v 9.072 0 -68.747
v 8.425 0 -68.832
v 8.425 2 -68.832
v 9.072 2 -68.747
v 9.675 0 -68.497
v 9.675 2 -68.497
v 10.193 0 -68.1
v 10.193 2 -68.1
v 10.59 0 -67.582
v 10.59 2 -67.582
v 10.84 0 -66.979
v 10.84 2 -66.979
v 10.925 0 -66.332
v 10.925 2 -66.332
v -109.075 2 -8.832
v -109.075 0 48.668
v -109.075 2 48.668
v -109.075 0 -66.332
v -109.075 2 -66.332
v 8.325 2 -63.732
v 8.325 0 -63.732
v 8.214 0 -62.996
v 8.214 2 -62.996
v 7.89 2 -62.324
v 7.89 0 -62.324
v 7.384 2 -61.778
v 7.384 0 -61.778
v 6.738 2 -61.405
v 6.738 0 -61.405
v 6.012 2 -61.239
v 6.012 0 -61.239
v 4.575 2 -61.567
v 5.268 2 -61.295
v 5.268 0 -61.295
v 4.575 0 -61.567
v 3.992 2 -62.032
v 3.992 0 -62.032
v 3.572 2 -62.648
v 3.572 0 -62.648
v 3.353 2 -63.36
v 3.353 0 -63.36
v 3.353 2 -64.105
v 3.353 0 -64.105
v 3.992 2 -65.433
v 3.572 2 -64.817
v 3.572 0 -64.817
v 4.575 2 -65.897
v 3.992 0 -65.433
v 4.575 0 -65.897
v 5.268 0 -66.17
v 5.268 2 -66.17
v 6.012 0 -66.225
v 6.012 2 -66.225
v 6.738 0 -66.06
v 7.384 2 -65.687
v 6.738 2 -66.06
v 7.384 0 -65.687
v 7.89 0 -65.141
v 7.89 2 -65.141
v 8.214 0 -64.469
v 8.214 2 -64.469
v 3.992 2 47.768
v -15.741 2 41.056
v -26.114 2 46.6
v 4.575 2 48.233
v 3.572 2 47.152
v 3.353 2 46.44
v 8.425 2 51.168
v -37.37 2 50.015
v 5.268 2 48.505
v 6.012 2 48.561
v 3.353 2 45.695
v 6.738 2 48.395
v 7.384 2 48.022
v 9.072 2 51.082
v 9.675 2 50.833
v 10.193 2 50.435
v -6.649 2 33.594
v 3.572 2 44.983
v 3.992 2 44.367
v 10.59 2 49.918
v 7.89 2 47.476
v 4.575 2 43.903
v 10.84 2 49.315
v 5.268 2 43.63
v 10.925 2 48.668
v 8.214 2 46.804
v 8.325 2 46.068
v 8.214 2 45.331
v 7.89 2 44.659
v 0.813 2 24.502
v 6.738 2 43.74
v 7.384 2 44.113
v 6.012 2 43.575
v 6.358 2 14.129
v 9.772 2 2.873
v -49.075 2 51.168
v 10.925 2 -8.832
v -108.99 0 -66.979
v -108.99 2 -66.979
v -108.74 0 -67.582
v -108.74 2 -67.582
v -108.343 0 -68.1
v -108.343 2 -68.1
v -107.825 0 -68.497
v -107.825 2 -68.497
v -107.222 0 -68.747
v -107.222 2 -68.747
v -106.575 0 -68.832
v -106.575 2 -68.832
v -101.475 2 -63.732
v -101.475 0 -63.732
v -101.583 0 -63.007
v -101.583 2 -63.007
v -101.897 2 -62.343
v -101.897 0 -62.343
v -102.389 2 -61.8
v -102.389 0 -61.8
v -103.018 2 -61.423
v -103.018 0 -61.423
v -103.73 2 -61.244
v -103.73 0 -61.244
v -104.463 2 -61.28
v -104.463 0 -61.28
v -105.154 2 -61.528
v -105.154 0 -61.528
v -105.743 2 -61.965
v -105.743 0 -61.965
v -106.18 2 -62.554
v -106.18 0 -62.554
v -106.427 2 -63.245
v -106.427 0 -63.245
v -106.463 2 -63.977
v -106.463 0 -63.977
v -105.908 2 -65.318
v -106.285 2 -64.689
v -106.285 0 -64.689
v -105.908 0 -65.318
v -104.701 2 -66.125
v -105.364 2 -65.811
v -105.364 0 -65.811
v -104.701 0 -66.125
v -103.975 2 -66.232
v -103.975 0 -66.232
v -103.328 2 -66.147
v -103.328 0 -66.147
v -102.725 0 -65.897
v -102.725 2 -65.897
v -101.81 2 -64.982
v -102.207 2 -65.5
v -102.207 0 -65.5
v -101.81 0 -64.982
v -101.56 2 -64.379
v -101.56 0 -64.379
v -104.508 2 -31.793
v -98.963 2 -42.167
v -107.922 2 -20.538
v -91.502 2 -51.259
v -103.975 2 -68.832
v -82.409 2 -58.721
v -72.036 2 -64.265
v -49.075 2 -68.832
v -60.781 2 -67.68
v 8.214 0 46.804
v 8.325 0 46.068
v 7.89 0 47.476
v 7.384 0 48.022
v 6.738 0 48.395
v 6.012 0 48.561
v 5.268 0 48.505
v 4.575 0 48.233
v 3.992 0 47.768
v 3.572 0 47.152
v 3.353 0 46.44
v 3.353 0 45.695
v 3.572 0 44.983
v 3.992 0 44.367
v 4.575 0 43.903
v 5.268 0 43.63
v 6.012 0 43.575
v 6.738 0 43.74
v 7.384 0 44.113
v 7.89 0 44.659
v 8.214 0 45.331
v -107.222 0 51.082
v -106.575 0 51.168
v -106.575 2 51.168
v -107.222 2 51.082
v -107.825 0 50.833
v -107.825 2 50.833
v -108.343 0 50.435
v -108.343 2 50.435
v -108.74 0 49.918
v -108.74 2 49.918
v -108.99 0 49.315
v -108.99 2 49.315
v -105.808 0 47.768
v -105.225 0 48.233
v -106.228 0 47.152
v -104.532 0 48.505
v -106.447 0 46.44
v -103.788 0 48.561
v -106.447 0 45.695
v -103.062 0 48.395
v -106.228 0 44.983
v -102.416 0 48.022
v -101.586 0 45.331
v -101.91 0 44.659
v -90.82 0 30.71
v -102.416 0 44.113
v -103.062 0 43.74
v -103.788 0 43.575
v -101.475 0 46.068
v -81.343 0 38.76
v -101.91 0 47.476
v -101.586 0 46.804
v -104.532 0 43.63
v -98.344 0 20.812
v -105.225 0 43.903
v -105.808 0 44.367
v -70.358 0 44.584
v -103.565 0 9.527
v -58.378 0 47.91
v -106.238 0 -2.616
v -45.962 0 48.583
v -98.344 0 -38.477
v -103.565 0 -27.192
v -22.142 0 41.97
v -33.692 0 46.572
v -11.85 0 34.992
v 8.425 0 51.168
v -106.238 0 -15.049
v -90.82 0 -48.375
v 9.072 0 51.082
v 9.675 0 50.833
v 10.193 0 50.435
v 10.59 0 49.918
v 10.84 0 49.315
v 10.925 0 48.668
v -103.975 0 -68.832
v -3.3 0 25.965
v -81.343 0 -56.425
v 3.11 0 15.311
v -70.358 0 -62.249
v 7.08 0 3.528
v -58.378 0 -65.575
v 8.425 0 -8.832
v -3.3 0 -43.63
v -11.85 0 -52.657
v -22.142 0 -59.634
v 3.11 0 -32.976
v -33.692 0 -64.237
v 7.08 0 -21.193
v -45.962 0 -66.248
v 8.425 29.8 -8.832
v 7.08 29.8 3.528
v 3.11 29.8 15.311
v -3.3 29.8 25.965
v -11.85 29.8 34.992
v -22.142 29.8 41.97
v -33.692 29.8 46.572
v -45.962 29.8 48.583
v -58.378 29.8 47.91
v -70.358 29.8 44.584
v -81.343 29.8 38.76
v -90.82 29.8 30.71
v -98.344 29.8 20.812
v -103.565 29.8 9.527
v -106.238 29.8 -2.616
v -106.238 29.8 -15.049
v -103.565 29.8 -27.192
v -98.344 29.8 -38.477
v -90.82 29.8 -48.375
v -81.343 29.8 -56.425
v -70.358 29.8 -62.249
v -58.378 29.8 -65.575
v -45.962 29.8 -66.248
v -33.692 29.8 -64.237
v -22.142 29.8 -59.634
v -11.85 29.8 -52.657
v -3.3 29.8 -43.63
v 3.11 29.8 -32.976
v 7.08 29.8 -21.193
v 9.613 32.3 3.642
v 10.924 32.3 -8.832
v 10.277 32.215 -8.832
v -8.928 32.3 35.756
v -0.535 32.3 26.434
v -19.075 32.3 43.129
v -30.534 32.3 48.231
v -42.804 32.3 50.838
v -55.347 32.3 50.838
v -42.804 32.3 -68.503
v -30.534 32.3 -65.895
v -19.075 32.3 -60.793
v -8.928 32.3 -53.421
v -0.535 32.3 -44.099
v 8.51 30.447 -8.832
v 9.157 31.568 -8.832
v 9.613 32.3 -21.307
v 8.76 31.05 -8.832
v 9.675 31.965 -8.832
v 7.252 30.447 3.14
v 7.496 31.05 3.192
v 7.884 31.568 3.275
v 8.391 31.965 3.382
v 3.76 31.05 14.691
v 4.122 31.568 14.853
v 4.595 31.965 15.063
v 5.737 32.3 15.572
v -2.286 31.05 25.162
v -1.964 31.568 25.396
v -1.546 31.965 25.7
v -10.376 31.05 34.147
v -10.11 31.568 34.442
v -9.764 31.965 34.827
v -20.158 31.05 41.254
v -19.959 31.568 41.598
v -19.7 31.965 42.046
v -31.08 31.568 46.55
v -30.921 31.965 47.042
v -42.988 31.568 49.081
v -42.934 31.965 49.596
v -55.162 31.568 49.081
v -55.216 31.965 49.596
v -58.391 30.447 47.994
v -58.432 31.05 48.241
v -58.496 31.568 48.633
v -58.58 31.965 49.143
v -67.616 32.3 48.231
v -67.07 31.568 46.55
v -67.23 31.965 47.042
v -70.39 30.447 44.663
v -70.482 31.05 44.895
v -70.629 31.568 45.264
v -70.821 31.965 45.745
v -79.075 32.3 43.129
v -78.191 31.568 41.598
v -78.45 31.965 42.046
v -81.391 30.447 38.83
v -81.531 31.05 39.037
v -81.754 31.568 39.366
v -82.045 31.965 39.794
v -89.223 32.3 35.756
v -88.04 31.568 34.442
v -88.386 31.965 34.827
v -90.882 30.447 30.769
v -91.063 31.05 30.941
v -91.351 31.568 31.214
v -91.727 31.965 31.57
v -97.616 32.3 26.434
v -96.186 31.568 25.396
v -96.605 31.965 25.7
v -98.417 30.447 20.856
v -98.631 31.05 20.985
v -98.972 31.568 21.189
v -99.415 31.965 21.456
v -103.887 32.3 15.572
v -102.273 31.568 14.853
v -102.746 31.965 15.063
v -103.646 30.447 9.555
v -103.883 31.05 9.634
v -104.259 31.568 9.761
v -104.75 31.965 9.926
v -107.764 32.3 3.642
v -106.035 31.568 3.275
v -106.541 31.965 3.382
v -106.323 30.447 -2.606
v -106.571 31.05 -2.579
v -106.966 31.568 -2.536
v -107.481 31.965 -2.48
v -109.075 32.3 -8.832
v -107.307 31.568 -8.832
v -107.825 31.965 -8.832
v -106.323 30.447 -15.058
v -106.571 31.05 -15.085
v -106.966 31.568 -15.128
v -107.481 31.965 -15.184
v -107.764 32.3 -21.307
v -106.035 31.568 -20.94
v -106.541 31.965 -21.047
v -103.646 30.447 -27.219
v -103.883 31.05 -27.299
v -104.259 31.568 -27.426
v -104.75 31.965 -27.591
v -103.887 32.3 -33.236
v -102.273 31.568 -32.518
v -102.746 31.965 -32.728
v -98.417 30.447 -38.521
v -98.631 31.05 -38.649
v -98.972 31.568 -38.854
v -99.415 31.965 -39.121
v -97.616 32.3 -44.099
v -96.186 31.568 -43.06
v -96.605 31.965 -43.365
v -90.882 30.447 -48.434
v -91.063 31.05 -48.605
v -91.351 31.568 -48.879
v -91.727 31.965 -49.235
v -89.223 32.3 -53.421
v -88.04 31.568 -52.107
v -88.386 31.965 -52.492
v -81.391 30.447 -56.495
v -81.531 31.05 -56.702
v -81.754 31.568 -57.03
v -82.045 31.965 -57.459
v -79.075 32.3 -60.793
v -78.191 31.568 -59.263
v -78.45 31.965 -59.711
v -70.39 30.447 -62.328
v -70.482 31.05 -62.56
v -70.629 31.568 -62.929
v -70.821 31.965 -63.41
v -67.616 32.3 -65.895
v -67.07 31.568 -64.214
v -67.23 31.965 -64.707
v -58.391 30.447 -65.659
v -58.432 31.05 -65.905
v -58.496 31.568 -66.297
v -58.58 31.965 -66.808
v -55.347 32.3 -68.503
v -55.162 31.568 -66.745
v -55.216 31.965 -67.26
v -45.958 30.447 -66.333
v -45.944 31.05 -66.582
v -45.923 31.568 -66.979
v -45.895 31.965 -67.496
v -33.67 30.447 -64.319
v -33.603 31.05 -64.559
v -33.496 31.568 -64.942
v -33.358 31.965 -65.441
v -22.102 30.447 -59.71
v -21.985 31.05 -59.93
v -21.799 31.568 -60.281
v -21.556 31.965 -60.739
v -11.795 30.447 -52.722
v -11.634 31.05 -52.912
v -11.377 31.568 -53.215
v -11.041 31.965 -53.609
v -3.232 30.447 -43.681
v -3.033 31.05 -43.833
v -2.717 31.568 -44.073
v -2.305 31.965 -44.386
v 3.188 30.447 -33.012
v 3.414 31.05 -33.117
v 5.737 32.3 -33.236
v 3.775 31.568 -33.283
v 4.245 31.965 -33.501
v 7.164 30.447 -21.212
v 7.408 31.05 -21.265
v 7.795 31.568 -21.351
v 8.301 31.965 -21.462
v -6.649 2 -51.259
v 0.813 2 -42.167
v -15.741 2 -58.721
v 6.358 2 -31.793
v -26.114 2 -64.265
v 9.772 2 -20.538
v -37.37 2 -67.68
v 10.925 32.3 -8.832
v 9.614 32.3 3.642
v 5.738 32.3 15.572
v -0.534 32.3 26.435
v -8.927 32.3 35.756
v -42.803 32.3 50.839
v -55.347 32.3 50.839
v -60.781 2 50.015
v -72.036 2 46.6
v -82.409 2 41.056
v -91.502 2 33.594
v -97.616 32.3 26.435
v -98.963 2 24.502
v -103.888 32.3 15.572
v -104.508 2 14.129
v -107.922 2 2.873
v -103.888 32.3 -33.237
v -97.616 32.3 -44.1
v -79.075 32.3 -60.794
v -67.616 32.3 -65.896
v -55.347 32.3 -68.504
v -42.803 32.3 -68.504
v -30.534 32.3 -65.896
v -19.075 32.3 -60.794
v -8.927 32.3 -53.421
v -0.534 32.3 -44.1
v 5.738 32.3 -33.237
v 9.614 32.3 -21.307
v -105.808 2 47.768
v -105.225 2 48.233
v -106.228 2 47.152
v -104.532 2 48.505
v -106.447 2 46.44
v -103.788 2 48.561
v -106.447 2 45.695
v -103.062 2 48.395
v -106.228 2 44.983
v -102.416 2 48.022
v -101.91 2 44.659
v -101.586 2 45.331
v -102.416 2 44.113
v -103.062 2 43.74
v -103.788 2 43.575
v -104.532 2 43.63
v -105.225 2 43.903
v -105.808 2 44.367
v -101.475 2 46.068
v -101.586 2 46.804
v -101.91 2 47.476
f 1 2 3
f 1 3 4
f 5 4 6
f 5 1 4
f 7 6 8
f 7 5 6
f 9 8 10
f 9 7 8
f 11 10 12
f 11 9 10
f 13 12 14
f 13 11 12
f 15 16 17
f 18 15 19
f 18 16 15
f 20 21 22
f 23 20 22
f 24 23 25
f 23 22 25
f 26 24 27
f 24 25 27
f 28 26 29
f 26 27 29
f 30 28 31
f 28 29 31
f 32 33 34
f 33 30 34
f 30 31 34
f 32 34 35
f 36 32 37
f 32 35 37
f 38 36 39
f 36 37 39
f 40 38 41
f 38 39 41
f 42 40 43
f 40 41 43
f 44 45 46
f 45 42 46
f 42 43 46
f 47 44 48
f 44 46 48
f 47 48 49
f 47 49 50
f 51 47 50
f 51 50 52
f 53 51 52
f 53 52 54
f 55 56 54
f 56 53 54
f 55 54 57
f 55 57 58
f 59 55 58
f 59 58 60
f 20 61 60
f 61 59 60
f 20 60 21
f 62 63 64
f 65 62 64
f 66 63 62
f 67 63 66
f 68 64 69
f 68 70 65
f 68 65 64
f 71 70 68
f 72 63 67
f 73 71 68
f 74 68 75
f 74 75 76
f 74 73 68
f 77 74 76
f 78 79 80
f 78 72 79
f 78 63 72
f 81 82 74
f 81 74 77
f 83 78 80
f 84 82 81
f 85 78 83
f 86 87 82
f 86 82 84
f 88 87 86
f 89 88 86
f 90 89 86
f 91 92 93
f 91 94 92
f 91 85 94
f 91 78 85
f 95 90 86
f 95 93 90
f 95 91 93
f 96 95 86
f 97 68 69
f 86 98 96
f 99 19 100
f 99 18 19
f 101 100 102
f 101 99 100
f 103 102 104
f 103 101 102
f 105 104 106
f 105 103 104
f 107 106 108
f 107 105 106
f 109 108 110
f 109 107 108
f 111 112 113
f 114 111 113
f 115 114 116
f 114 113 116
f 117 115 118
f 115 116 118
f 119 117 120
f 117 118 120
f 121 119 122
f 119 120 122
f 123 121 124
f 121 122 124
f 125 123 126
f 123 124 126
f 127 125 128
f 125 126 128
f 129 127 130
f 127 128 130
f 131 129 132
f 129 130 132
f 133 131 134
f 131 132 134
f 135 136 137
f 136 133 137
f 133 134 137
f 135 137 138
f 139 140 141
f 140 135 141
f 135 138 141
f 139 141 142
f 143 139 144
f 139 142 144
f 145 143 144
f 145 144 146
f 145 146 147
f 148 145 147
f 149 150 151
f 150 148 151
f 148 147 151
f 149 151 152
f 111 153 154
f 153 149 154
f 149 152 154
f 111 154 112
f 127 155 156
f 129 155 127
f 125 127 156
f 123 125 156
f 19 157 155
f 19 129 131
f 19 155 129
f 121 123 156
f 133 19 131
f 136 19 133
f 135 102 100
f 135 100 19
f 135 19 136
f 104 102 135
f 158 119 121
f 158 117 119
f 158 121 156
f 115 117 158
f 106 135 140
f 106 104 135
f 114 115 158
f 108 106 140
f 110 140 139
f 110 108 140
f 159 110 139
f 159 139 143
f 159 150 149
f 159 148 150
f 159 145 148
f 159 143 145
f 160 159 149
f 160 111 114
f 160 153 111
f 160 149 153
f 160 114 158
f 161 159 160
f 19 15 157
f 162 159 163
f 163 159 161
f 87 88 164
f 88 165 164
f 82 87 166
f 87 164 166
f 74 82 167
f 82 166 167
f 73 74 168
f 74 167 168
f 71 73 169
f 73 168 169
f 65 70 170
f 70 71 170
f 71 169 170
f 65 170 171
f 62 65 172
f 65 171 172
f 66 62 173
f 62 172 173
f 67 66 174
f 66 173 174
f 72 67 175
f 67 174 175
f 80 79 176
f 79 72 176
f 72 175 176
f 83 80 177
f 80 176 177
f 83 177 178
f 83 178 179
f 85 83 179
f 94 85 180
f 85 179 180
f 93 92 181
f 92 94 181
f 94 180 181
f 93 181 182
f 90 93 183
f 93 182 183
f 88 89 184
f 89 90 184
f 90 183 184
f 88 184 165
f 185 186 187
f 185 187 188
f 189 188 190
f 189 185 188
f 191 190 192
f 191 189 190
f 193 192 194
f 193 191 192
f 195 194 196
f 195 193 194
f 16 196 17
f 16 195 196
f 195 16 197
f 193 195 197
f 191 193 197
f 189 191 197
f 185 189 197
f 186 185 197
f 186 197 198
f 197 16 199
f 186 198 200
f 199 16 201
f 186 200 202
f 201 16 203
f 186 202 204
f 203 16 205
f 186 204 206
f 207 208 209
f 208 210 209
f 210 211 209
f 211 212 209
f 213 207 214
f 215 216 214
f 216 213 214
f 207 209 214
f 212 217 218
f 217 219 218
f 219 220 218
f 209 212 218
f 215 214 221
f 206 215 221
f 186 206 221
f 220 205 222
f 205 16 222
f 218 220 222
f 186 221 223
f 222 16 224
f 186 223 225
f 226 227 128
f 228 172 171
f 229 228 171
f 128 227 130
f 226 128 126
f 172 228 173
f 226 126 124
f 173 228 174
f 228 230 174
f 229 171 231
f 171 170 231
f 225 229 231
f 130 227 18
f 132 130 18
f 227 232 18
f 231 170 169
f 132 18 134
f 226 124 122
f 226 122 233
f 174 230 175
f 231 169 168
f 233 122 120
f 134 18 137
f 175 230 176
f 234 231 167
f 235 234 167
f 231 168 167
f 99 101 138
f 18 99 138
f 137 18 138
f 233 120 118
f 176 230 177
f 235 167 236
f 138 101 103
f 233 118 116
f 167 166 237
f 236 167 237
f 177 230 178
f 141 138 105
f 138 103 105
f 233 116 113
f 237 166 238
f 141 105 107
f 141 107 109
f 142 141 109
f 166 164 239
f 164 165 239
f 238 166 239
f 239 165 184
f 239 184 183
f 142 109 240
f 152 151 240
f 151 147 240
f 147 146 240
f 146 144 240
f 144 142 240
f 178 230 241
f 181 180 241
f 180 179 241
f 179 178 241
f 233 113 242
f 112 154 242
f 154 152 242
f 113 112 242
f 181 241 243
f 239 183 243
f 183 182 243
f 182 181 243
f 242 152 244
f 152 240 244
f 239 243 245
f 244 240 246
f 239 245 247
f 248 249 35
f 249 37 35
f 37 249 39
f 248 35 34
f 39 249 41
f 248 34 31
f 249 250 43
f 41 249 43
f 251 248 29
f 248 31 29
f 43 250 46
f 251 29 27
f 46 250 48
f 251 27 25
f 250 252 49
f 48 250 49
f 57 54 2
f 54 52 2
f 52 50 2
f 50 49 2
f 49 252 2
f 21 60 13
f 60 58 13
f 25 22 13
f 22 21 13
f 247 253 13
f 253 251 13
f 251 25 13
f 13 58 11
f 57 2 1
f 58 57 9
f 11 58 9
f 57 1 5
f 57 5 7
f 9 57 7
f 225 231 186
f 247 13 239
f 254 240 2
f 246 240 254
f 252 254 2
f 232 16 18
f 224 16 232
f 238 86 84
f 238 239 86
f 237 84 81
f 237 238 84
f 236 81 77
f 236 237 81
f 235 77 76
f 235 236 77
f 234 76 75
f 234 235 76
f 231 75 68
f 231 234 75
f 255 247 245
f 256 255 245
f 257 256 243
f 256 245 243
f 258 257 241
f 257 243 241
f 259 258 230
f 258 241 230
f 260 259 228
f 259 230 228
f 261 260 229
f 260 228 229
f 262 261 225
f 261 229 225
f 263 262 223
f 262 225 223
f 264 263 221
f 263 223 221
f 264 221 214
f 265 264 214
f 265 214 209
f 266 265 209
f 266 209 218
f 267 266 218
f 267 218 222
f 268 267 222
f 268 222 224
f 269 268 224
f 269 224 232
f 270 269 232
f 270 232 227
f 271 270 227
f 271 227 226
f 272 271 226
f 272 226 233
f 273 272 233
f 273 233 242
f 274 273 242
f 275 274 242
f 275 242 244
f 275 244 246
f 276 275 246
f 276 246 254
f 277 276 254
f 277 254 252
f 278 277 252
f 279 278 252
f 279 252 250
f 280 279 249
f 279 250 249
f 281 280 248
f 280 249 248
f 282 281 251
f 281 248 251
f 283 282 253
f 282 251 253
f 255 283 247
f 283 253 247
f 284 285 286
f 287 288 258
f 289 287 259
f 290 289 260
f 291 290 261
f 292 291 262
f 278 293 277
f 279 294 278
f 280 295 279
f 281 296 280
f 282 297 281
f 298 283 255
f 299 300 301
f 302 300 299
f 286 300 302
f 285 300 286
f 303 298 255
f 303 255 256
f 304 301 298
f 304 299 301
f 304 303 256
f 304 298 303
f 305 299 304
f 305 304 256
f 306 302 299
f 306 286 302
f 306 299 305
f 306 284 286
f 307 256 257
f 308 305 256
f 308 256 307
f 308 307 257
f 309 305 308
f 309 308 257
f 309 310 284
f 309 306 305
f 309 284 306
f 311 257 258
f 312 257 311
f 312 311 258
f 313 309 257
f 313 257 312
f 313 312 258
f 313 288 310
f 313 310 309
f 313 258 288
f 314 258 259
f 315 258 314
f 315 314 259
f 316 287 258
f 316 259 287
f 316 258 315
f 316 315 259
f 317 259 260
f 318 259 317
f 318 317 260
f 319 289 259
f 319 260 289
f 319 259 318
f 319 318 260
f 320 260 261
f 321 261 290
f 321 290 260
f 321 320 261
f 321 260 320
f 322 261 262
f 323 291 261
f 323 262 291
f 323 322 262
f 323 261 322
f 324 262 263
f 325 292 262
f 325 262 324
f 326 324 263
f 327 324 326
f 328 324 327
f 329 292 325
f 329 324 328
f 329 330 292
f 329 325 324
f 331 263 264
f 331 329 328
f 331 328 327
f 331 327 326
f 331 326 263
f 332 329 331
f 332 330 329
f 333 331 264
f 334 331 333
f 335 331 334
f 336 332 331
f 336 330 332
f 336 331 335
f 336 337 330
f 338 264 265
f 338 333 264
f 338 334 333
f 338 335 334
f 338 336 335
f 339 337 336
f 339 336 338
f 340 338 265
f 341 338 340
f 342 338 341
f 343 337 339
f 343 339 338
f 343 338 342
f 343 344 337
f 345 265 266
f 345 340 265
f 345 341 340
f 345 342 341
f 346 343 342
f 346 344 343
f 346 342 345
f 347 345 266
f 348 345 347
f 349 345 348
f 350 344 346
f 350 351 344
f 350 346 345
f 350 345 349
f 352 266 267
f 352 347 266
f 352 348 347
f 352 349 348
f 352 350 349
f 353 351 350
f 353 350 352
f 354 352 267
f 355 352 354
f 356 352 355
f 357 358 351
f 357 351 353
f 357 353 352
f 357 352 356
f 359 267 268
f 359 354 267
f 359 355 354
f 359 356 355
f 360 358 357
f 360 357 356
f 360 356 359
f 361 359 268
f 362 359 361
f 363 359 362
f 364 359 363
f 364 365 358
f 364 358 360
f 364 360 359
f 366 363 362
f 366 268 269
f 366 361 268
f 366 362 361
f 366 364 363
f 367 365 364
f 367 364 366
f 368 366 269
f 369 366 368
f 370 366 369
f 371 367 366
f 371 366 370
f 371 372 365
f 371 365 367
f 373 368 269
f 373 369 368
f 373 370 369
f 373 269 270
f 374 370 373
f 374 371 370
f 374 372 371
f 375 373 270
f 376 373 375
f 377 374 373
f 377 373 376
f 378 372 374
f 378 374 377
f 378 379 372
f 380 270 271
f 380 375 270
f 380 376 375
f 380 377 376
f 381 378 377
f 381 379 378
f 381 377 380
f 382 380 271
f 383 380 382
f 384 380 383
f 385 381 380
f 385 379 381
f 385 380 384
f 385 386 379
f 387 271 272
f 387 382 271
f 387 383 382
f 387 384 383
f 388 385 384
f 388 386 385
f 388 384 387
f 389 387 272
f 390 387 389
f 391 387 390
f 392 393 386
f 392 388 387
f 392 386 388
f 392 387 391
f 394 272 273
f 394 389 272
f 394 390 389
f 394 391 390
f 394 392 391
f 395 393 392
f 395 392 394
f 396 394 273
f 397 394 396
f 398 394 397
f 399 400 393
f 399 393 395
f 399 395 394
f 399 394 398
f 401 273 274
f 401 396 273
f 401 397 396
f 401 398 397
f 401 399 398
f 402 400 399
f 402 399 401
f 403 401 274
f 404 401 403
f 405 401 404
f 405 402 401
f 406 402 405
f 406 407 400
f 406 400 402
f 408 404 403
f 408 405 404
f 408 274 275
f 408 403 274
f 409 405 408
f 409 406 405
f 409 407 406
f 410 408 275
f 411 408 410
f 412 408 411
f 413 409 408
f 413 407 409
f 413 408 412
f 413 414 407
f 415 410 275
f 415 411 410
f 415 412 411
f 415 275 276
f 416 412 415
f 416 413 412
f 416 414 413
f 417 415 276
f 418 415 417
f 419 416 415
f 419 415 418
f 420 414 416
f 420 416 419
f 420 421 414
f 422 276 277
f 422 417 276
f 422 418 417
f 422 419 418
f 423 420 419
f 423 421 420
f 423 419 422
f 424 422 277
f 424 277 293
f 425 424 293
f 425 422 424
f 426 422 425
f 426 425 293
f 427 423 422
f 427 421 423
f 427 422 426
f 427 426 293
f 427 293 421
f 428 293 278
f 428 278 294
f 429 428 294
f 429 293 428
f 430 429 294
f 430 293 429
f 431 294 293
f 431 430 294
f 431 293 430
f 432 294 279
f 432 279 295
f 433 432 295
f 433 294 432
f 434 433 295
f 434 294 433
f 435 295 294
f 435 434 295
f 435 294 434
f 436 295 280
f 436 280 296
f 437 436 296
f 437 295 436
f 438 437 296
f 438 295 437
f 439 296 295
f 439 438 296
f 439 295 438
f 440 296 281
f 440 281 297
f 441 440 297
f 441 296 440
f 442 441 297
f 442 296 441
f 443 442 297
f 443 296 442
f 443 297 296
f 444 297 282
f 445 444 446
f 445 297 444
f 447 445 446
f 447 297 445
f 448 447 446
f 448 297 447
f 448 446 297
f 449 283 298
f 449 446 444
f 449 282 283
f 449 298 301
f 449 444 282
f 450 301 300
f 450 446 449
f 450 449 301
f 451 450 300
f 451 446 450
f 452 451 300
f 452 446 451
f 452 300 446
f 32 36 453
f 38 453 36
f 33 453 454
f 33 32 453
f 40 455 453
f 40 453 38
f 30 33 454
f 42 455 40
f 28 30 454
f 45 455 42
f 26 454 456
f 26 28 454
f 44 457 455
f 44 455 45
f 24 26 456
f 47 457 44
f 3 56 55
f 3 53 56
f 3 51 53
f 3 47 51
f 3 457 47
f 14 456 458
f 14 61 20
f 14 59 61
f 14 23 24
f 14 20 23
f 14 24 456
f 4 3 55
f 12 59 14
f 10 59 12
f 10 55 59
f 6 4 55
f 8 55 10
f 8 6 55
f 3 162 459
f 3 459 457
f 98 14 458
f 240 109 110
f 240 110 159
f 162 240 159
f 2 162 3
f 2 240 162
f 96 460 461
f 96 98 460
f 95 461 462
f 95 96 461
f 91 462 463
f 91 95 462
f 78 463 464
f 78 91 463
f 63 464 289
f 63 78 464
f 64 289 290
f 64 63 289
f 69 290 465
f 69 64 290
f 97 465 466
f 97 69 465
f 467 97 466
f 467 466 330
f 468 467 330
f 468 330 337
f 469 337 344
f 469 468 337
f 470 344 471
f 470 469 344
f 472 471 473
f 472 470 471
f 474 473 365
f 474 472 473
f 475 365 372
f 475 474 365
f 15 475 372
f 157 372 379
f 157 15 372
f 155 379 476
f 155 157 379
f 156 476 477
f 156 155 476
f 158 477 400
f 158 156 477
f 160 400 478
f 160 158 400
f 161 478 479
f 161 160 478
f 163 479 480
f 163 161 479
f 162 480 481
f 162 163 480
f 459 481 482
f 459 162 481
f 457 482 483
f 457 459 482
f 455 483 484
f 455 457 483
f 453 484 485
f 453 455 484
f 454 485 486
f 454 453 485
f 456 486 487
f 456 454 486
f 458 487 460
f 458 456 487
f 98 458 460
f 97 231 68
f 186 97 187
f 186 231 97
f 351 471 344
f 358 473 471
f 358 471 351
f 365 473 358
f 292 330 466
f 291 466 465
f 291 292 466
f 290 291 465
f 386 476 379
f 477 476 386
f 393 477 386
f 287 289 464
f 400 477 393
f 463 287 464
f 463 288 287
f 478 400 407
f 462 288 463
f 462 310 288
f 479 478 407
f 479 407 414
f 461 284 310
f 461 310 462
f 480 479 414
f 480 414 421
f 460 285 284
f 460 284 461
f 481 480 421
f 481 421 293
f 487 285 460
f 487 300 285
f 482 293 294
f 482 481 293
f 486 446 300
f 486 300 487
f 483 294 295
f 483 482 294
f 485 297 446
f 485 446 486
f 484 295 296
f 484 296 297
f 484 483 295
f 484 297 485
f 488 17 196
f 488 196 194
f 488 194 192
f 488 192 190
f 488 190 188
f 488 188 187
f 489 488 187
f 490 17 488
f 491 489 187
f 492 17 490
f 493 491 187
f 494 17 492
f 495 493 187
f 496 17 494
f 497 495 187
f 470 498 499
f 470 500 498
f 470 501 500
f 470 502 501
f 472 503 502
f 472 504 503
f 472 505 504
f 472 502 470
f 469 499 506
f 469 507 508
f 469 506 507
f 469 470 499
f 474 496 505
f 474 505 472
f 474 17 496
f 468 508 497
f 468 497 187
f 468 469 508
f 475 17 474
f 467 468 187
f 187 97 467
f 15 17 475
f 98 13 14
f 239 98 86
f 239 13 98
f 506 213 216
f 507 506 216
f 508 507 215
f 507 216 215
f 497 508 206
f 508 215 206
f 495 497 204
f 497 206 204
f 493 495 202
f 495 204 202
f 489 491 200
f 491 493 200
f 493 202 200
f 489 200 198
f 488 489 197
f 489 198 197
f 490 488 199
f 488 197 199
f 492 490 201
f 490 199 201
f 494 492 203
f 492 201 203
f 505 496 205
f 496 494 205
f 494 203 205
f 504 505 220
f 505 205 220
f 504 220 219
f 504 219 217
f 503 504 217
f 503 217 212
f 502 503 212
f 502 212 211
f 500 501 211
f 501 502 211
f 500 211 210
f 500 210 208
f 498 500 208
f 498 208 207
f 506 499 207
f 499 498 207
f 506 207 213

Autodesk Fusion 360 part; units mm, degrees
sketch "Sketch1" plane through (0, 0, 0) normal (0, 1, 0) x (1, 0, 0)
  line L0 (-106.5752, 68.8324) -> (8.4248, 68.8324)
  line L1 (10.9248, 66.3324) -> (10.9248, -48.6676)
  line L2 (8.4248, -51.1676) -> (-106.5752, -51.1676)
  line L3 (-109.0752, -48.6676) -> (-109.0752, 66.3324)
  line L4 (-49.0752, 68.8324) -> (-49.0752, -51.1676)
  line L5 (-109.0752, 8.8324) -> (10.9248, 8.8324)
  circle A0 centre (-49.0752, 8.8324) radius 57.5
  line L6 (-109.0752, 68.8324) -> (-103.9752, 68.8324)
  line L7 (-103.9752, 68.8324) -> (-103.9752, 63.7324)
  circle A1 centre (-103.9752, 63.7324) radius 2.5
  circle A2 centre (5.8248, 63.7324) radius 2.5
  circle A3 centre (-103.9752, -46.0676) radius 2.5
  circle A4 centre (5.8248, -46.0676) radius 2.5
  circle A5 centre (-49.0752, 8.8324) radius 60
  arc A6 (-109.0752, -48.6676) -> (-106.5752, -51.1676) centre (-106.5752, -48.6676) ccw
  arc A7 (8.4248, -51.1676) -> (10.9248, -48.6676) centre (8.4248, -48.6676) ccw
  arc A8 (10.9248, 66.3324) -> (8.4248, 68.8324) centre (8.4248, 66.3324) ccw
  arc A9 (-106.5752, 68.8324) -> (-109.0752, 66.3324) centre (-106.5752, 66.3324) ccw
  point P0 (10.9248, 68.8324)
  point P1 (10.9248, -51.1676)
  dimension "d1" = 120
  dimension "d2" = 120
  dimension "d3" = 115
  dimension "d4" = 5.1
  dimension "d6" = 5.1
  dimension "d7" = 5
  dimension "d8" = 2.5
  dimension "d9" = 2.5
  dimension "d10" = 2.5
  dimension "d11" = 2.5
extrude "Extrude1" add sketch "Sketch1" along normal blind 2 contours L0 L3 L6 A5 A9 | L0 L1 A5 A8 | L2 L3 A5 A6 | L1 L2 A5 A7
extrude "Extrude2" add sketch "Sketch1" along normal blind 24 contours L4 L5 A0 A5 | L4 L5 A0 A5 | L4 L5 A0 A5 | L4 L5 A0 A5
fillet "Fillet1" radius 2 1 edges at (-102.684, 24, -29.6253)
extrude "Extrude3" add sketch "Sketch1" along normal blind 32.3 contours L4 L5 A0 A5 | L4 L5 A0 A5 | L4 L5 A0 A5 | L4 L5 A0 A5
fillet "Fillet2" radius 2.5 1 edges at (-102.684, 32.3, -29.6253)
